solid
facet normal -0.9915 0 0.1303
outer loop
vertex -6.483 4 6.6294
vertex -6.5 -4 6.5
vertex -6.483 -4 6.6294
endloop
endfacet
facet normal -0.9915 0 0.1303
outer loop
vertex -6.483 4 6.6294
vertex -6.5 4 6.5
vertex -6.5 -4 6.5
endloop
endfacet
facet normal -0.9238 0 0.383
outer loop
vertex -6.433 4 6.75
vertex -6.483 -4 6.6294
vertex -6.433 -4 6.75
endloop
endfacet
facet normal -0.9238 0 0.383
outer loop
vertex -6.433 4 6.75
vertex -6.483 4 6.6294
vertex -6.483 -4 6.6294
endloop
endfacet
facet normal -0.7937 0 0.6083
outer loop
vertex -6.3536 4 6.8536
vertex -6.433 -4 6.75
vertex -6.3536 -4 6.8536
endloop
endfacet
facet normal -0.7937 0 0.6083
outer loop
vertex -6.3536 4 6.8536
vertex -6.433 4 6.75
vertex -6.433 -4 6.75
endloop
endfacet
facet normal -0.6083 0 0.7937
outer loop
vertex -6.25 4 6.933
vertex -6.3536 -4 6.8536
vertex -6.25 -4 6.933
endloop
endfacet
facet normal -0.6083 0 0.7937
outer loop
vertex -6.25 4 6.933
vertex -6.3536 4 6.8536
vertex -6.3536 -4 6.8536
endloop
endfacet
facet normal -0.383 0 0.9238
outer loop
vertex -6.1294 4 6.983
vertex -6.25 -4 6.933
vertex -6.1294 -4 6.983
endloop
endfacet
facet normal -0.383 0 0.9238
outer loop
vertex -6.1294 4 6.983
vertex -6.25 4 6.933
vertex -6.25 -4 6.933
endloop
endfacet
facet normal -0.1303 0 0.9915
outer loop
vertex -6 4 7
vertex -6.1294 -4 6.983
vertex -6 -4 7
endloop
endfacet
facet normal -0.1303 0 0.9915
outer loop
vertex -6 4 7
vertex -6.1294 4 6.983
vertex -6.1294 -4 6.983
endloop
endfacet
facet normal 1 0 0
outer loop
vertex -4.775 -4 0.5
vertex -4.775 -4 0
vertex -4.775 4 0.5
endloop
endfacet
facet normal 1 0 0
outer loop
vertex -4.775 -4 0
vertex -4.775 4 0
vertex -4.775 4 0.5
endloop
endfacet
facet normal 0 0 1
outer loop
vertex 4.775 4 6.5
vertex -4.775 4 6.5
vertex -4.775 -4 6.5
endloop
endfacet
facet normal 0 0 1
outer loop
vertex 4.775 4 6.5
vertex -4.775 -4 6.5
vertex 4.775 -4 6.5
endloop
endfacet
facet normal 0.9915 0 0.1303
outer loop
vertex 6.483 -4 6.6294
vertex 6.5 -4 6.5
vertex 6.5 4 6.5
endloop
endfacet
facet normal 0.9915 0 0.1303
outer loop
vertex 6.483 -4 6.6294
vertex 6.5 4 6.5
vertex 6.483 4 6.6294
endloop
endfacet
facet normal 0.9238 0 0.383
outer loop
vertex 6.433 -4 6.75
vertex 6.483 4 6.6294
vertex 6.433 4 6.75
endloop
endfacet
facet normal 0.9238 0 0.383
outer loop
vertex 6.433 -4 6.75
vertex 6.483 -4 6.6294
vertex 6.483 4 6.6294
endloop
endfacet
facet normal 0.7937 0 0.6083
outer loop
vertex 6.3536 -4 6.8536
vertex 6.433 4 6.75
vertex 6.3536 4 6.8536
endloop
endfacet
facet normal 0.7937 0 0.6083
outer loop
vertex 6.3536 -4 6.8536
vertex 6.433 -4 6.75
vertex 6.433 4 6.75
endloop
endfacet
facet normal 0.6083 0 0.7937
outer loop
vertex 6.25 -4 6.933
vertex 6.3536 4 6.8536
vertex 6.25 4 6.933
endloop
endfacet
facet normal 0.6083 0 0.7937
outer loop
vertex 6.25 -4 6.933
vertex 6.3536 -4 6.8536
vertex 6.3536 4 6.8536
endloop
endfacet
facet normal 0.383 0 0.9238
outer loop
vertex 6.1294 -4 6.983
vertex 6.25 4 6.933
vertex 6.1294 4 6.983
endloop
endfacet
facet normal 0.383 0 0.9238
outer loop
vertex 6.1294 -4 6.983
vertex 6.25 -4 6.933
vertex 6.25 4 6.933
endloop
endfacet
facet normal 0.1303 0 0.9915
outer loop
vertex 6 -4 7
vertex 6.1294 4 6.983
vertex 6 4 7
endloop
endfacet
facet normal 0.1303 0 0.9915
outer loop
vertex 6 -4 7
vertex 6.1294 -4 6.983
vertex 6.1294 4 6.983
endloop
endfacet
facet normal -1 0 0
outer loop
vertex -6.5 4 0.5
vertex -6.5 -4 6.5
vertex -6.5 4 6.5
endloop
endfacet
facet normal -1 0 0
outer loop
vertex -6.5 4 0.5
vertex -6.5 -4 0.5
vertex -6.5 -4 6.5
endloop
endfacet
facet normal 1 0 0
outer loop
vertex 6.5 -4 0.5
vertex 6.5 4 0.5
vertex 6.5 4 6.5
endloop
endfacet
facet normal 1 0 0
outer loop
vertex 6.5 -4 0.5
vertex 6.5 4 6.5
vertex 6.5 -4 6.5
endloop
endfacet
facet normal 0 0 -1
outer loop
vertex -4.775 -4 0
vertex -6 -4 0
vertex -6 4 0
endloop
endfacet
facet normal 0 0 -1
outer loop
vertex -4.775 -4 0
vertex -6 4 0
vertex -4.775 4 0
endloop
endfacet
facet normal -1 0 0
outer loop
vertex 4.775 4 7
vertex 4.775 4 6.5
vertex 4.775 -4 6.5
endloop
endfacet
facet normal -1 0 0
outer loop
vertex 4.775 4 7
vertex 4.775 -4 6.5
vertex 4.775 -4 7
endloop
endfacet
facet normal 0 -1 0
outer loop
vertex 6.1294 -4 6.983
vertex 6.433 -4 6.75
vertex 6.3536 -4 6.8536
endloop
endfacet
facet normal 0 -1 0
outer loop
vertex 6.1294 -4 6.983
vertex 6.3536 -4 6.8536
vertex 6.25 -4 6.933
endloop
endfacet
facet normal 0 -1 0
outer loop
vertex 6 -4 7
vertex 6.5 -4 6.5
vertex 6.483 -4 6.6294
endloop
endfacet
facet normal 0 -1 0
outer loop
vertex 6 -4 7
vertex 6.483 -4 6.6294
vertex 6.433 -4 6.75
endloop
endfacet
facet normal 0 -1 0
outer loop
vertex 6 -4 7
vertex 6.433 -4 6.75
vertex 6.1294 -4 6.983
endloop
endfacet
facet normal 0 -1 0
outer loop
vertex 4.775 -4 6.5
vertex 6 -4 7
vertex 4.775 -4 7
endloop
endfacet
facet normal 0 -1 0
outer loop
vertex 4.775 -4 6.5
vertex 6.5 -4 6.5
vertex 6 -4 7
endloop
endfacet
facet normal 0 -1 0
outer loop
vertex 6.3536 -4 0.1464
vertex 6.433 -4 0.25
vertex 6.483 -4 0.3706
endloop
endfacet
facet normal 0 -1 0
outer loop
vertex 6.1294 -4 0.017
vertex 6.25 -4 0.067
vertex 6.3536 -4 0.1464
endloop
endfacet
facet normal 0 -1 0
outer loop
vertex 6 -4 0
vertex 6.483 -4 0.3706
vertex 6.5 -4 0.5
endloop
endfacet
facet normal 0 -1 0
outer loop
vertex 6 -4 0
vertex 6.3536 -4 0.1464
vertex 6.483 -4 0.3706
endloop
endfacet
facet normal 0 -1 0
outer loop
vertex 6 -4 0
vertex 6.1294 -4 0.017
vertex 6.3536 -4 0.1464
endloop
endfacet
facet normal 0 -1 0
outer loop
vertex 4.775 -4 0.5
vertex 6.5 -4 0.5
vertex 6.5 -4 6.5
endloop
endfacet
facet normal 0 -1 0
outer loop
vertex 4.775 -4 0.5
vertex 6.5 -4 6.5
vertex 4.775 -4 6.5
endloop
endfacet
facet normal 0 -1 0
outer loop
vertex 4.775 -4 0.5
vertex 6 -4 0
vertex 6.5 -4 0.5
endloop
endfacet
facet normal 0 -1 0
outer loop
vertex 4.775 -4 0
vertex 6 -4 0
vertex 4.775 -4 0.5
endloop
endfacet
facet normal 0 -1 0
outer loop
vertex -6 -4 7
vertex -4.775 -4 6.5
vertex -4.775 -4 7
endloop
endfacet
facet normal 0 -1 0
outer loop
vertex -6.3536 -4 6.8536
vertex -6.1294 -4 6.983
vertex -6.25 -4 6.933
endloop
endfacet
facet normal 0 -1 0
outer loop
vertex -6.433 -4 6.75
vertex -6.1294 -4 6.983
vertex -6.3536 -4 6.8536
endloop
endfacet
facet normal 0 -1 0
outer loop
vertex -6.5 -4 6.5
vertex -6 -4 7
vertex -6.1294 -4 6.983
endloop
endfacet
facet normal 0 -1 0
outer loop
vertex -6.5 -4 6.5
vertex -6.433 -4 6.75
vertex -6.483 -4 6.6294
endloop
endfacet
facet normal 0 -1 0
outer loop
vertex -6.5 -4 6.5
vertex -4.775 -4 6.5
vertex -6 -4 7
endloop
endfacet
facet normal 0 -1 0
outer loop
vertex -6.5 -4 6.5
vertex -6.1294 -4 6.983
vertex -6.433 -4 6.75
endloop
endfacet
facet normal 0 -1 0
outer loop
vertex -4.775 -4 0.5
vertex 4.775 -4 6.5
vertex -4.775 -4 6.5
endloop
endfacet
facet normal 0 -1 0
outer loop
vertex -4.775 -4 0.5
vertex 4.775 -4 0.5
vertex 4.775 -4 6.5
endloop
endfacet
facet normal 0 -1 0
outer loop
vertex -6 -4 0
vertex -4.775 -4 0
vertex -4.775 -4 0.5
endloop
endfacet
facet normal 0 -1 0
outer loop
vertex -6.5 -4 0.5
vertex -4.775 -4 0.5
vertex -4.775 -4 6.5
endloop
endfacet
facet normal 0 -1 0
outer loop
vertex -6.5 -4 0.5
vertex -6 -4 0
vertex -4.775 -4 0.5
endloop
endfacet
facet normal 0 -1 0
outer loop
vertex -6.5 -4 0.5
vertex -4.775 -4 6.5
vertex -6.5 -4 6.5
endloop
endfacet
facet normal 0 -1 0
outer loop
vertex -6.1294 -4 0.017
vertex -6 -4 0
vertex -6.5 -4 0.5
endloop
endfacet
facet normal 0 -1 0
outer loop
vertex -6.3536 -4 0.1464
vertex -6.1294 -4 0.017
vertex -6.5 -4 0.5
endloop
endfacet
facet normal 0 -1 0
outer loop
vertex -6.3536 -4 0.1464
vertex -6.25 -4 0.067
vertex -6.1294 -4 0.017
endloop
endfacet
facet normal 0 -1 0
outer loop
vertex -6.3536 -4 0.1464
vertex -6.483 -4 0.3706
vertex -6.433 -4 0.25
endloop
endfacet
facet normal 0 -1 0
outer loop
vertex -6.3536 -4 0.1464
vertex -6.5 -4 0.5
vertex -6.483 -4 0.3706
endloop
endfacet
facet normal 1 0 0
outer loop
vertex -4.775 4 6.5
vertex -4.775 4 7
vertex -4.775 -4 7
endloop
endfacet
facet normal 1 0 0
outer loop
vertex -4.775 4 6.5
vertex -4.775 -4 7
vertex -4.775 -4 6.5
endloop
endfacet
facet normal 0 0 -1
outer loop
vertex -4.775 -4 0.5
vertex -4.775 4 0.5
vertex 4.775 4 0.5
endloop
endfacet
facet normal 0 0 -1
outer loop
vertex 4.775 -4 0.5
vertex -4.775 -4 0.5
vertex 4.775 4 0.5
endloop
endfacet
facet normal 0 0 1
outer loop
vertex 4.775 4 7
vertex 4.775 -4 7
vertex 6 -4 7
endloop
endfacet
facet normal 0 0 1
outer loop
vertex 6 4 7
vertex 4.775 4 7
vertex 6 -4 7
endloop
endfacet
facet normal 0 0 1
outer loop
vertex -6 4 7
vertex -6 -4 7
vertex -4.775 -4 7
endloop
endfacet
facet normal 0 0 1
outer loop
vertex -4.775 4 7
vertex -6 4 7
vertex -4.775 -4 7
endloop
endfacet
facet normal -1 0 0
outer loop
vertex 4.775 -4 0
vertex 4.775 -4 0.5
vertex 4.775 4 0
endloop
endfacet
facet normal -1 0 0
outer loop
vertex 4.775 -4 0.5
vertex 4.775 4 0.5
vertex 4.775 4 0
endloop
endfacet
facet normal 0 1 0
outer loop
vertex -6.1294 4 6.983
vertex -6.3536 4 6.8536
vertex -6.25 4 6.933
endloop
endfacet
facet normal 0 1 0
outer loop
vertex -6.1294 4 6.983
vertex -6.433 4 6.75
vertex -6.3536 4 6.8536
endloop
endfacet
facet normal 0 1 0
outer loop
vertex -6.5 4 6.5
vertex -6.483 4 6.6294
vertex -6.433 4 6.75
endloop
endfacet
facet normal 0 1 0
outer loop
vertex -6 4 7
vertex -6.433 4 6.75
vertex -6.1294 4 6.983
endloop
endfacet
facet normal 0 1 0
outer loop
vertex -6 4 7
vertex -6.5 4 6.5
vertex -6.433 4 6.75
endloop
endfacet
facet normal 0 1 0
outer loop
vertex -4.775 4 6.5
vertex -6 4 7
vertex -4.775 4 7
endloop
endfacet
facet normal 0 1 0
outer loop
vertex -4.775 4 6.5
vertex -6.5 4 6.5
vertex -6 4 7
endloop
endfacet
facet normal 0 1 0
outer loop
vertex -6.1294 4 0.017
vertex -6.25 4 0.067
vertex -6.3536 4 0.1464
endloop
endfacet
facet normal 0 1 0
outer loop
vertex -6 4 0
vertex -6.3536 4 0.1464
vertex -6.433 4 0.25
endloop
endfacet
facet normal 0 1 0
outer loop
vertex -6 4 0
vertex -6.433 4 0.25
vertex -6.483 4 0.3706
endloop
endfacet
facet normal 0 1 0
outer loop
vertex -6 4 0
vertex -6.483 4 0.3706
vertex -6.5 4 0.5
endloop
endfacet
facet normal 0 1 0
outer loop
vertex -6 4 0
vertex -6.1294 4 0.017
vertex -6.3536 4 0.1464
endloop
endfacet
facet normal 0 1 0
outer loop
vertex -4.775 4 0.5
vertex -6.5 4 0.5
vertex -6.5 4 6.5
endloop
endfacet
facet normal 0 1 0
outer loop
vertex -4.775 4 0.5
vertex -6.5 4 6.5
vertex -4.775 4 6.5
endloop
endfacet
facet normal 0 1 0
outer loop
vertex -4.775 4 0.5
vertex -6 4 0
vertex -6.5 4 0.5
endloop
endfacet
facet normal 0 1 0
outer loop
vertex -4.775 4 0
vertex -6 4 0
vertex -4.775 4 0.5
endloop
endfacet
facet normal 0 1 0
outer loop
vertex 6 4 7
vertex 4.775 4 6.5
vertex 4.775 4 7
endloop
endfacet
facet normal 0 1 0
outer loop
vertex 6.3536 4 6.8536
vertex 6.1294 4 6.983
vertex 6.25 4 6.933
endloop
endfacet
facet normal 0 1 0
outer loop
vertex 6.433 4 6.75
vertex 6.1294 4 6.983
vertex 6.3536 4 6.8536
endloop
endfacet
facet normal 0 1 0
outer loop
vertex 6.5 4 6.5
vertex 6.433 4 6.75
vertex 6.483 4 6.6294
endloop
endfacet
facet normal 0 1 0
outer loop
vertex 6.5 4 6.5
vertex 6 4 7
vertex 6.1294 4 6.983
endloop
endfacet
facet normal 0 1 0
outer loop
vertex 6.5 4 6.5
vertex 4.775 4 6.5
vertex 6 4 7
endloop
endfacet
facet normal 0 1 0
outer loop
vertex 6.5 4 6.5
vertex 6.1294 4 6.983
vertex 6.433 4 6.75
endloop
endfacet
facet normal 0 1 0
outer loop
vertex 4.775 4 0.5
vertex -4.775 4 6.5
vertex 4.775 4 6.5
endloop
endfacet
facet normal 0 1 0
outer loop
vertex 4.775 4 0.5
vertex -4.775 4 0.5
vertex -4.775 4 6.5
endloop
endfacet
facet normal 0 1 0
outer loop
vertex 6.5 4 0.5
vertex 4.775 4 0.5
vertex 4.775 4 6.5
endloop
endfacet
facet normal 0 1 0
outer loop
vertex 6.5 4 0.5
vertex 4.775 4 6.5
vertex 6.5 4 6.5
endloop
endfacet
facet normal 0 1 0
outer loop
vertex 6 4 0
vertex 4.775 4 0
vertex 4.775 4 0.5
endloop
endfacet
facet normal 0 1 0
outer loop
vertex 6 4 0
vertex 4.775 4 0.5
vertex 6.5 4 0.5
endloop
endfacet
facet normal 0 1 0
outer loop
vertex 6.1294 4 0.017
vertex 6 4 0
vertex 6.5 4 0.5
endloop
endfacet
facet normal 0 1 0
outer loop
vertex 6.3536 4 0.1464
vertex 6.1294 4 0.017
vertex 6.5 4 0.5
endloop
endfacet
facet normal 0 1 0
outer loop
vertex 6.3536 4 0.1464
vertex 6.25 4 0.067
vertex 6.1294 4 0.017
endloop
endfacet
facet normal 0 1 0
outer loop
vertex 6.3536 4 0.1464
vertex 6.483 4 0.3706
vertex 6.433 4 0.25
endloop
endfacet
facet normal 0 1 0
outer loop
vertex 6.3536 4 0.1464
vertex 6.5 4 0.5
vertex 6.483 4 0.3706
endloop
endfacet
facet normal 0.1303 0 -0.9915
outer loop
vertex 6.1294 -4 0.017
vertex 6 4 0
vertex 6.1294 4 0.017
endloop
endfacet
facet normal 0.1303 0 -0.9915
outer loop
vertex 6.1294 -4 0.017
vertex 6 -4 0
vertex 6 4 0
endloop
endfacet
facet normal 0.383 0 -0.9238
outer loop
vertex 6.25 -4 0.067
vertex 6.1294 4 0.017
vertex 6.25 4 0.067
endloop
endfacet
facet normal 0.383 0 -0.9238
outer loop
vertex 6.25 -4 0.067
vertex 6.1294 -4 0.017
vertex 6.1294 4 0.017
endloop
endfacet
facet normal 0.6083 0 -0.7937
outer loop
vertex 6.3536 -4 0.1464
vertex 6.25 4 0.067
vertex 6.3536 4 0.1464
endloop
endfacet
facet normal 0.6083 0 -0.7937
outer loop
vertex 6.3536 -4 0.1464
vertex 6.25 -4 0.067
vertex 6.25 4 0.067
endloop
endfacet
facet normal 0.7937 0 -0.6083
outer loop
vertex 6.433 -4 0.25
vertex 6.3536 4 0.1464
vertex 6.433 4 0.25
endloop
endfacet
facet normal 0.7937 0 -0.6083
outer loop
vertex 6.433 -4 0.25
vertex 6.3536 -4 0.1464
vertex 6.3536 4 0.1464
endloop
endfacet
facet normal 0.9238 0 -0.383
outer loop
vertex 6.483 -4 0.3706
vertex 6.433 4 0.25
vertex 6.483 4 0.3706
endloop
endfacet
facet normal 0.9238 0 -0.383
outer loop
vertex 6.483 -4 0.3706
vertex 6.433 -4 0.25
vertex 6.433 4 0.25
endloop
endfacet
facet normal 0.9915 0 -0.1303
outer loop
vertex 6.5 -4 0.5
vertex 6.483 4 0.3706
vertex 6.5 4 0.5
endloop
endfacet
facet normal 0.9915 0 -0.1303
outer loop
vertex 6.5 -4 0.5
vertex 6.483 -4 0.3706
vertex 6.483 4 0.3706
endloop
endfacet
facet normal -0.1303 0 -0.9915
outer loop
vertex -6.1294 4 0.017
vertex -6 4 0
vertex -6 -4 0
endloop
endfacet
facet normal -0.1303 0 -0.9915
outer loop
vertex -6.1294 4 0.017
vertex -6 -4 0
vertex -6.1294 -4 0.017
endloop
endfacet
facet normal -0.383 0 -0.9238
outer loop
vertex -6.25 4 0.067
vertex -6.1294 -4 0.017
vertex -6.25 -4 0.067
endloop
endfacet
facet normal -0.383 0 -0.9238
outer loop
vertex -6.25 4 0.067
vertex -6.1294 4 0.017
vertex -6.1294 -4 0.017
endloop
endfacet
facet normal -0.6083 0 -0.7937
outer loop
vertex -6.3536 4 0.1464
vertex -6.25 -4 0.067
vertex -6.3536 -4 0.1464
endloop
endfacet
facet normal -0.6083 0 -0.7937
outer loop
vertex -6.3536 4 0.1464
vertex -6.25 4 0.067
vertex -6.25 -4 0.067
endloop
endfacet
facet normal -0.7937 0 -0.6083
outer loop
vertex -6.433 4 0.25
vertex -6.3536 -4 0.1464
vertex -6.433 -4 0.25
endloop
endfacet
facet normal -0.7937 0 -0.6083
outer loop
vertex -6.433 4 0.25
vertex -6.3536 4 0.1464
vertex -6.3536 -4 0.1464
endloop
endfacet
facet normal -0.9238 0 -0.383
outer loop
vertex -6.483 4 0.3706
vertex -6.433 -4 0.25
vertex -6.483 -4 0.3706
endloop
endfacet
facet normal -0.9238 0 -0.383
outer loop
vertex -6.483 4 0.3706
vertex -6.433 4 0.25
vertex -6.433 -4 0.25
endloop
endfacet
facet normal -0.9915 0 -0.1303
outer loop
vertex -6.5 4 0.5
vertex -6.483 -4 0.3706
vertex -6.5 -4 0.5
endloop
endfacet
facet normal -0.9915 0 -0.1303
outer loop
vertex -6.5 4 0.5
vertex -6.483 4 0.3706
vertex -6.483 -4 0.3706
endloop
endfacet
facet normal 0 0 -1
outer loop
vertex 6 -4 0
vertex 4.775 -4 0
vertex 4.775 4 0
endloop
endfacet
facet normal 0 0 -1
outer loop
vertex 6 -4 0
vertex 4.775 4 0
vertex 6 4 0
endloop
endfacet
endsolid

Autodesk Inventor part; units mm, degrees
ref_plane "YZ Plane" through (0, 0, 0) normal (1, 0, 0) x (0, 1, 0)
ref_plane "XZ Plane" through (0, 0, 0) normal (0, 1, 0) x (-1, 0, 0)
ref_plane "XY Plane" through (0, 0, 0) normal (0, 0, 1) x (1, 0, 0)
sketch "Sketch1" plane through (0, 0, 0) normal (0, 0, 1) x (1, 0, 0)
  line L0 (-6.5, 4) -> (6.5, 4)
  line L1 (6.5, 4) -> (6.5, -4)
  line L2 (6.5, -4) -> (-6.5, -4)
  line L3 (-6.5, -4) -> (-6.5, 4)
  point P0 (0, 0)
  point P1 (-6.5, 0)
  point P2 (0, -4)
  dimension "d0" = 8
  dimension "d1" = 13
extrude "Extrusion1" add sketch "Sketch1" along normal blind 7
sketch "Sketch2" plane through (-6.5, 4, 0) normal (0, 1, 0) x (1, 0, 0)
  line L0 (0, -7) -> (13, -7) projected
  line L1 (0, 0) -> (13, 0) projected
  line L2 (11.275, -7) -> (1.725, -7)
  line L3 (1.725, -7) -> (1.725, -6.5)
  line L4 (1.725, -6.5) -> (11.275, -6.5)
  line L5 (11.275, -6.5) -> (11.275, -7)
  line L6 (11.275, 0) -> (1.725, 0)
  line L7 (1.725, 0) -> (1.725, -0.5)
  line L8 (1.725, -0.5) -> (11.275, -0.5)
  line L9 (11.275, -0.5) -> (11.275, 0)
  line L10 (1.725, -0.05) -> (11.275, -0.05) projected
  line L11 (1.725, -0.3) -> (1.725, -0.05) projected
  line L12 (0.5, -0.3) -> (1.725, -0.3) projected
  line L13 (0, -0.8) -> (0.5, -0.3) projected
  line L14 (0, -6.2) -> (0, -0.8) projected
  line L15 (0.5, -6.7) -> (0, -6.2) projected
  line L16 (1.725, -6.7) -> (0.5, -6.7) projected
  line L17 (1.725, -6.7) -> (1.725, -6.75) projected
  line L18 (11.275, -6.75) -> (1.725, -6.75) projected
  line L19 (11.275, -6.7) -> (11.275, -6.75) projected
  line L20 (12.5, -6.7) -> (11.275, -6.7) projected
  line L21 (13, -6.2) -> (12.5, -6.7) projected
  line L22 (13, -0.8) -> (13, -6.2) projected
  line L23 (12.5, -0.3) -> (13, -0.8) projected
  line L24 (11.275, -0.3) -> (12.5, -0.3) projected
  line L25 (11.275, -0.3) -> (11.275, -0.05) projected
  point P0 (6.5, 0)
  point P1 (6.5, -7)
  point P2 (6.5, -7)
  point P3 (6.5, -0.5)
  point P4 (6.5, 0)
  dimension "d4" = 0.5
  dimension "d5" = 0.5
  dimension "d6" = 9.55
  dimension "d7" = 9.55
extrude "Extrusion2" cut sketch "Sketch2" against normal through all contours L3 L18 L5 L0 | L3 L4 L5 L18 | L7 L10 L9 L8 | L7 L1 L9 L10
fillet "Fillet1" radius 0.5 4 edges at (6.5, 0, 7) (6.5, 0, 0) (-6.5, 0, 0) (-6.5, 0, 7)
equation "\"d7\" = d6"
properties part number "SPDT Toggle Switch Base"
